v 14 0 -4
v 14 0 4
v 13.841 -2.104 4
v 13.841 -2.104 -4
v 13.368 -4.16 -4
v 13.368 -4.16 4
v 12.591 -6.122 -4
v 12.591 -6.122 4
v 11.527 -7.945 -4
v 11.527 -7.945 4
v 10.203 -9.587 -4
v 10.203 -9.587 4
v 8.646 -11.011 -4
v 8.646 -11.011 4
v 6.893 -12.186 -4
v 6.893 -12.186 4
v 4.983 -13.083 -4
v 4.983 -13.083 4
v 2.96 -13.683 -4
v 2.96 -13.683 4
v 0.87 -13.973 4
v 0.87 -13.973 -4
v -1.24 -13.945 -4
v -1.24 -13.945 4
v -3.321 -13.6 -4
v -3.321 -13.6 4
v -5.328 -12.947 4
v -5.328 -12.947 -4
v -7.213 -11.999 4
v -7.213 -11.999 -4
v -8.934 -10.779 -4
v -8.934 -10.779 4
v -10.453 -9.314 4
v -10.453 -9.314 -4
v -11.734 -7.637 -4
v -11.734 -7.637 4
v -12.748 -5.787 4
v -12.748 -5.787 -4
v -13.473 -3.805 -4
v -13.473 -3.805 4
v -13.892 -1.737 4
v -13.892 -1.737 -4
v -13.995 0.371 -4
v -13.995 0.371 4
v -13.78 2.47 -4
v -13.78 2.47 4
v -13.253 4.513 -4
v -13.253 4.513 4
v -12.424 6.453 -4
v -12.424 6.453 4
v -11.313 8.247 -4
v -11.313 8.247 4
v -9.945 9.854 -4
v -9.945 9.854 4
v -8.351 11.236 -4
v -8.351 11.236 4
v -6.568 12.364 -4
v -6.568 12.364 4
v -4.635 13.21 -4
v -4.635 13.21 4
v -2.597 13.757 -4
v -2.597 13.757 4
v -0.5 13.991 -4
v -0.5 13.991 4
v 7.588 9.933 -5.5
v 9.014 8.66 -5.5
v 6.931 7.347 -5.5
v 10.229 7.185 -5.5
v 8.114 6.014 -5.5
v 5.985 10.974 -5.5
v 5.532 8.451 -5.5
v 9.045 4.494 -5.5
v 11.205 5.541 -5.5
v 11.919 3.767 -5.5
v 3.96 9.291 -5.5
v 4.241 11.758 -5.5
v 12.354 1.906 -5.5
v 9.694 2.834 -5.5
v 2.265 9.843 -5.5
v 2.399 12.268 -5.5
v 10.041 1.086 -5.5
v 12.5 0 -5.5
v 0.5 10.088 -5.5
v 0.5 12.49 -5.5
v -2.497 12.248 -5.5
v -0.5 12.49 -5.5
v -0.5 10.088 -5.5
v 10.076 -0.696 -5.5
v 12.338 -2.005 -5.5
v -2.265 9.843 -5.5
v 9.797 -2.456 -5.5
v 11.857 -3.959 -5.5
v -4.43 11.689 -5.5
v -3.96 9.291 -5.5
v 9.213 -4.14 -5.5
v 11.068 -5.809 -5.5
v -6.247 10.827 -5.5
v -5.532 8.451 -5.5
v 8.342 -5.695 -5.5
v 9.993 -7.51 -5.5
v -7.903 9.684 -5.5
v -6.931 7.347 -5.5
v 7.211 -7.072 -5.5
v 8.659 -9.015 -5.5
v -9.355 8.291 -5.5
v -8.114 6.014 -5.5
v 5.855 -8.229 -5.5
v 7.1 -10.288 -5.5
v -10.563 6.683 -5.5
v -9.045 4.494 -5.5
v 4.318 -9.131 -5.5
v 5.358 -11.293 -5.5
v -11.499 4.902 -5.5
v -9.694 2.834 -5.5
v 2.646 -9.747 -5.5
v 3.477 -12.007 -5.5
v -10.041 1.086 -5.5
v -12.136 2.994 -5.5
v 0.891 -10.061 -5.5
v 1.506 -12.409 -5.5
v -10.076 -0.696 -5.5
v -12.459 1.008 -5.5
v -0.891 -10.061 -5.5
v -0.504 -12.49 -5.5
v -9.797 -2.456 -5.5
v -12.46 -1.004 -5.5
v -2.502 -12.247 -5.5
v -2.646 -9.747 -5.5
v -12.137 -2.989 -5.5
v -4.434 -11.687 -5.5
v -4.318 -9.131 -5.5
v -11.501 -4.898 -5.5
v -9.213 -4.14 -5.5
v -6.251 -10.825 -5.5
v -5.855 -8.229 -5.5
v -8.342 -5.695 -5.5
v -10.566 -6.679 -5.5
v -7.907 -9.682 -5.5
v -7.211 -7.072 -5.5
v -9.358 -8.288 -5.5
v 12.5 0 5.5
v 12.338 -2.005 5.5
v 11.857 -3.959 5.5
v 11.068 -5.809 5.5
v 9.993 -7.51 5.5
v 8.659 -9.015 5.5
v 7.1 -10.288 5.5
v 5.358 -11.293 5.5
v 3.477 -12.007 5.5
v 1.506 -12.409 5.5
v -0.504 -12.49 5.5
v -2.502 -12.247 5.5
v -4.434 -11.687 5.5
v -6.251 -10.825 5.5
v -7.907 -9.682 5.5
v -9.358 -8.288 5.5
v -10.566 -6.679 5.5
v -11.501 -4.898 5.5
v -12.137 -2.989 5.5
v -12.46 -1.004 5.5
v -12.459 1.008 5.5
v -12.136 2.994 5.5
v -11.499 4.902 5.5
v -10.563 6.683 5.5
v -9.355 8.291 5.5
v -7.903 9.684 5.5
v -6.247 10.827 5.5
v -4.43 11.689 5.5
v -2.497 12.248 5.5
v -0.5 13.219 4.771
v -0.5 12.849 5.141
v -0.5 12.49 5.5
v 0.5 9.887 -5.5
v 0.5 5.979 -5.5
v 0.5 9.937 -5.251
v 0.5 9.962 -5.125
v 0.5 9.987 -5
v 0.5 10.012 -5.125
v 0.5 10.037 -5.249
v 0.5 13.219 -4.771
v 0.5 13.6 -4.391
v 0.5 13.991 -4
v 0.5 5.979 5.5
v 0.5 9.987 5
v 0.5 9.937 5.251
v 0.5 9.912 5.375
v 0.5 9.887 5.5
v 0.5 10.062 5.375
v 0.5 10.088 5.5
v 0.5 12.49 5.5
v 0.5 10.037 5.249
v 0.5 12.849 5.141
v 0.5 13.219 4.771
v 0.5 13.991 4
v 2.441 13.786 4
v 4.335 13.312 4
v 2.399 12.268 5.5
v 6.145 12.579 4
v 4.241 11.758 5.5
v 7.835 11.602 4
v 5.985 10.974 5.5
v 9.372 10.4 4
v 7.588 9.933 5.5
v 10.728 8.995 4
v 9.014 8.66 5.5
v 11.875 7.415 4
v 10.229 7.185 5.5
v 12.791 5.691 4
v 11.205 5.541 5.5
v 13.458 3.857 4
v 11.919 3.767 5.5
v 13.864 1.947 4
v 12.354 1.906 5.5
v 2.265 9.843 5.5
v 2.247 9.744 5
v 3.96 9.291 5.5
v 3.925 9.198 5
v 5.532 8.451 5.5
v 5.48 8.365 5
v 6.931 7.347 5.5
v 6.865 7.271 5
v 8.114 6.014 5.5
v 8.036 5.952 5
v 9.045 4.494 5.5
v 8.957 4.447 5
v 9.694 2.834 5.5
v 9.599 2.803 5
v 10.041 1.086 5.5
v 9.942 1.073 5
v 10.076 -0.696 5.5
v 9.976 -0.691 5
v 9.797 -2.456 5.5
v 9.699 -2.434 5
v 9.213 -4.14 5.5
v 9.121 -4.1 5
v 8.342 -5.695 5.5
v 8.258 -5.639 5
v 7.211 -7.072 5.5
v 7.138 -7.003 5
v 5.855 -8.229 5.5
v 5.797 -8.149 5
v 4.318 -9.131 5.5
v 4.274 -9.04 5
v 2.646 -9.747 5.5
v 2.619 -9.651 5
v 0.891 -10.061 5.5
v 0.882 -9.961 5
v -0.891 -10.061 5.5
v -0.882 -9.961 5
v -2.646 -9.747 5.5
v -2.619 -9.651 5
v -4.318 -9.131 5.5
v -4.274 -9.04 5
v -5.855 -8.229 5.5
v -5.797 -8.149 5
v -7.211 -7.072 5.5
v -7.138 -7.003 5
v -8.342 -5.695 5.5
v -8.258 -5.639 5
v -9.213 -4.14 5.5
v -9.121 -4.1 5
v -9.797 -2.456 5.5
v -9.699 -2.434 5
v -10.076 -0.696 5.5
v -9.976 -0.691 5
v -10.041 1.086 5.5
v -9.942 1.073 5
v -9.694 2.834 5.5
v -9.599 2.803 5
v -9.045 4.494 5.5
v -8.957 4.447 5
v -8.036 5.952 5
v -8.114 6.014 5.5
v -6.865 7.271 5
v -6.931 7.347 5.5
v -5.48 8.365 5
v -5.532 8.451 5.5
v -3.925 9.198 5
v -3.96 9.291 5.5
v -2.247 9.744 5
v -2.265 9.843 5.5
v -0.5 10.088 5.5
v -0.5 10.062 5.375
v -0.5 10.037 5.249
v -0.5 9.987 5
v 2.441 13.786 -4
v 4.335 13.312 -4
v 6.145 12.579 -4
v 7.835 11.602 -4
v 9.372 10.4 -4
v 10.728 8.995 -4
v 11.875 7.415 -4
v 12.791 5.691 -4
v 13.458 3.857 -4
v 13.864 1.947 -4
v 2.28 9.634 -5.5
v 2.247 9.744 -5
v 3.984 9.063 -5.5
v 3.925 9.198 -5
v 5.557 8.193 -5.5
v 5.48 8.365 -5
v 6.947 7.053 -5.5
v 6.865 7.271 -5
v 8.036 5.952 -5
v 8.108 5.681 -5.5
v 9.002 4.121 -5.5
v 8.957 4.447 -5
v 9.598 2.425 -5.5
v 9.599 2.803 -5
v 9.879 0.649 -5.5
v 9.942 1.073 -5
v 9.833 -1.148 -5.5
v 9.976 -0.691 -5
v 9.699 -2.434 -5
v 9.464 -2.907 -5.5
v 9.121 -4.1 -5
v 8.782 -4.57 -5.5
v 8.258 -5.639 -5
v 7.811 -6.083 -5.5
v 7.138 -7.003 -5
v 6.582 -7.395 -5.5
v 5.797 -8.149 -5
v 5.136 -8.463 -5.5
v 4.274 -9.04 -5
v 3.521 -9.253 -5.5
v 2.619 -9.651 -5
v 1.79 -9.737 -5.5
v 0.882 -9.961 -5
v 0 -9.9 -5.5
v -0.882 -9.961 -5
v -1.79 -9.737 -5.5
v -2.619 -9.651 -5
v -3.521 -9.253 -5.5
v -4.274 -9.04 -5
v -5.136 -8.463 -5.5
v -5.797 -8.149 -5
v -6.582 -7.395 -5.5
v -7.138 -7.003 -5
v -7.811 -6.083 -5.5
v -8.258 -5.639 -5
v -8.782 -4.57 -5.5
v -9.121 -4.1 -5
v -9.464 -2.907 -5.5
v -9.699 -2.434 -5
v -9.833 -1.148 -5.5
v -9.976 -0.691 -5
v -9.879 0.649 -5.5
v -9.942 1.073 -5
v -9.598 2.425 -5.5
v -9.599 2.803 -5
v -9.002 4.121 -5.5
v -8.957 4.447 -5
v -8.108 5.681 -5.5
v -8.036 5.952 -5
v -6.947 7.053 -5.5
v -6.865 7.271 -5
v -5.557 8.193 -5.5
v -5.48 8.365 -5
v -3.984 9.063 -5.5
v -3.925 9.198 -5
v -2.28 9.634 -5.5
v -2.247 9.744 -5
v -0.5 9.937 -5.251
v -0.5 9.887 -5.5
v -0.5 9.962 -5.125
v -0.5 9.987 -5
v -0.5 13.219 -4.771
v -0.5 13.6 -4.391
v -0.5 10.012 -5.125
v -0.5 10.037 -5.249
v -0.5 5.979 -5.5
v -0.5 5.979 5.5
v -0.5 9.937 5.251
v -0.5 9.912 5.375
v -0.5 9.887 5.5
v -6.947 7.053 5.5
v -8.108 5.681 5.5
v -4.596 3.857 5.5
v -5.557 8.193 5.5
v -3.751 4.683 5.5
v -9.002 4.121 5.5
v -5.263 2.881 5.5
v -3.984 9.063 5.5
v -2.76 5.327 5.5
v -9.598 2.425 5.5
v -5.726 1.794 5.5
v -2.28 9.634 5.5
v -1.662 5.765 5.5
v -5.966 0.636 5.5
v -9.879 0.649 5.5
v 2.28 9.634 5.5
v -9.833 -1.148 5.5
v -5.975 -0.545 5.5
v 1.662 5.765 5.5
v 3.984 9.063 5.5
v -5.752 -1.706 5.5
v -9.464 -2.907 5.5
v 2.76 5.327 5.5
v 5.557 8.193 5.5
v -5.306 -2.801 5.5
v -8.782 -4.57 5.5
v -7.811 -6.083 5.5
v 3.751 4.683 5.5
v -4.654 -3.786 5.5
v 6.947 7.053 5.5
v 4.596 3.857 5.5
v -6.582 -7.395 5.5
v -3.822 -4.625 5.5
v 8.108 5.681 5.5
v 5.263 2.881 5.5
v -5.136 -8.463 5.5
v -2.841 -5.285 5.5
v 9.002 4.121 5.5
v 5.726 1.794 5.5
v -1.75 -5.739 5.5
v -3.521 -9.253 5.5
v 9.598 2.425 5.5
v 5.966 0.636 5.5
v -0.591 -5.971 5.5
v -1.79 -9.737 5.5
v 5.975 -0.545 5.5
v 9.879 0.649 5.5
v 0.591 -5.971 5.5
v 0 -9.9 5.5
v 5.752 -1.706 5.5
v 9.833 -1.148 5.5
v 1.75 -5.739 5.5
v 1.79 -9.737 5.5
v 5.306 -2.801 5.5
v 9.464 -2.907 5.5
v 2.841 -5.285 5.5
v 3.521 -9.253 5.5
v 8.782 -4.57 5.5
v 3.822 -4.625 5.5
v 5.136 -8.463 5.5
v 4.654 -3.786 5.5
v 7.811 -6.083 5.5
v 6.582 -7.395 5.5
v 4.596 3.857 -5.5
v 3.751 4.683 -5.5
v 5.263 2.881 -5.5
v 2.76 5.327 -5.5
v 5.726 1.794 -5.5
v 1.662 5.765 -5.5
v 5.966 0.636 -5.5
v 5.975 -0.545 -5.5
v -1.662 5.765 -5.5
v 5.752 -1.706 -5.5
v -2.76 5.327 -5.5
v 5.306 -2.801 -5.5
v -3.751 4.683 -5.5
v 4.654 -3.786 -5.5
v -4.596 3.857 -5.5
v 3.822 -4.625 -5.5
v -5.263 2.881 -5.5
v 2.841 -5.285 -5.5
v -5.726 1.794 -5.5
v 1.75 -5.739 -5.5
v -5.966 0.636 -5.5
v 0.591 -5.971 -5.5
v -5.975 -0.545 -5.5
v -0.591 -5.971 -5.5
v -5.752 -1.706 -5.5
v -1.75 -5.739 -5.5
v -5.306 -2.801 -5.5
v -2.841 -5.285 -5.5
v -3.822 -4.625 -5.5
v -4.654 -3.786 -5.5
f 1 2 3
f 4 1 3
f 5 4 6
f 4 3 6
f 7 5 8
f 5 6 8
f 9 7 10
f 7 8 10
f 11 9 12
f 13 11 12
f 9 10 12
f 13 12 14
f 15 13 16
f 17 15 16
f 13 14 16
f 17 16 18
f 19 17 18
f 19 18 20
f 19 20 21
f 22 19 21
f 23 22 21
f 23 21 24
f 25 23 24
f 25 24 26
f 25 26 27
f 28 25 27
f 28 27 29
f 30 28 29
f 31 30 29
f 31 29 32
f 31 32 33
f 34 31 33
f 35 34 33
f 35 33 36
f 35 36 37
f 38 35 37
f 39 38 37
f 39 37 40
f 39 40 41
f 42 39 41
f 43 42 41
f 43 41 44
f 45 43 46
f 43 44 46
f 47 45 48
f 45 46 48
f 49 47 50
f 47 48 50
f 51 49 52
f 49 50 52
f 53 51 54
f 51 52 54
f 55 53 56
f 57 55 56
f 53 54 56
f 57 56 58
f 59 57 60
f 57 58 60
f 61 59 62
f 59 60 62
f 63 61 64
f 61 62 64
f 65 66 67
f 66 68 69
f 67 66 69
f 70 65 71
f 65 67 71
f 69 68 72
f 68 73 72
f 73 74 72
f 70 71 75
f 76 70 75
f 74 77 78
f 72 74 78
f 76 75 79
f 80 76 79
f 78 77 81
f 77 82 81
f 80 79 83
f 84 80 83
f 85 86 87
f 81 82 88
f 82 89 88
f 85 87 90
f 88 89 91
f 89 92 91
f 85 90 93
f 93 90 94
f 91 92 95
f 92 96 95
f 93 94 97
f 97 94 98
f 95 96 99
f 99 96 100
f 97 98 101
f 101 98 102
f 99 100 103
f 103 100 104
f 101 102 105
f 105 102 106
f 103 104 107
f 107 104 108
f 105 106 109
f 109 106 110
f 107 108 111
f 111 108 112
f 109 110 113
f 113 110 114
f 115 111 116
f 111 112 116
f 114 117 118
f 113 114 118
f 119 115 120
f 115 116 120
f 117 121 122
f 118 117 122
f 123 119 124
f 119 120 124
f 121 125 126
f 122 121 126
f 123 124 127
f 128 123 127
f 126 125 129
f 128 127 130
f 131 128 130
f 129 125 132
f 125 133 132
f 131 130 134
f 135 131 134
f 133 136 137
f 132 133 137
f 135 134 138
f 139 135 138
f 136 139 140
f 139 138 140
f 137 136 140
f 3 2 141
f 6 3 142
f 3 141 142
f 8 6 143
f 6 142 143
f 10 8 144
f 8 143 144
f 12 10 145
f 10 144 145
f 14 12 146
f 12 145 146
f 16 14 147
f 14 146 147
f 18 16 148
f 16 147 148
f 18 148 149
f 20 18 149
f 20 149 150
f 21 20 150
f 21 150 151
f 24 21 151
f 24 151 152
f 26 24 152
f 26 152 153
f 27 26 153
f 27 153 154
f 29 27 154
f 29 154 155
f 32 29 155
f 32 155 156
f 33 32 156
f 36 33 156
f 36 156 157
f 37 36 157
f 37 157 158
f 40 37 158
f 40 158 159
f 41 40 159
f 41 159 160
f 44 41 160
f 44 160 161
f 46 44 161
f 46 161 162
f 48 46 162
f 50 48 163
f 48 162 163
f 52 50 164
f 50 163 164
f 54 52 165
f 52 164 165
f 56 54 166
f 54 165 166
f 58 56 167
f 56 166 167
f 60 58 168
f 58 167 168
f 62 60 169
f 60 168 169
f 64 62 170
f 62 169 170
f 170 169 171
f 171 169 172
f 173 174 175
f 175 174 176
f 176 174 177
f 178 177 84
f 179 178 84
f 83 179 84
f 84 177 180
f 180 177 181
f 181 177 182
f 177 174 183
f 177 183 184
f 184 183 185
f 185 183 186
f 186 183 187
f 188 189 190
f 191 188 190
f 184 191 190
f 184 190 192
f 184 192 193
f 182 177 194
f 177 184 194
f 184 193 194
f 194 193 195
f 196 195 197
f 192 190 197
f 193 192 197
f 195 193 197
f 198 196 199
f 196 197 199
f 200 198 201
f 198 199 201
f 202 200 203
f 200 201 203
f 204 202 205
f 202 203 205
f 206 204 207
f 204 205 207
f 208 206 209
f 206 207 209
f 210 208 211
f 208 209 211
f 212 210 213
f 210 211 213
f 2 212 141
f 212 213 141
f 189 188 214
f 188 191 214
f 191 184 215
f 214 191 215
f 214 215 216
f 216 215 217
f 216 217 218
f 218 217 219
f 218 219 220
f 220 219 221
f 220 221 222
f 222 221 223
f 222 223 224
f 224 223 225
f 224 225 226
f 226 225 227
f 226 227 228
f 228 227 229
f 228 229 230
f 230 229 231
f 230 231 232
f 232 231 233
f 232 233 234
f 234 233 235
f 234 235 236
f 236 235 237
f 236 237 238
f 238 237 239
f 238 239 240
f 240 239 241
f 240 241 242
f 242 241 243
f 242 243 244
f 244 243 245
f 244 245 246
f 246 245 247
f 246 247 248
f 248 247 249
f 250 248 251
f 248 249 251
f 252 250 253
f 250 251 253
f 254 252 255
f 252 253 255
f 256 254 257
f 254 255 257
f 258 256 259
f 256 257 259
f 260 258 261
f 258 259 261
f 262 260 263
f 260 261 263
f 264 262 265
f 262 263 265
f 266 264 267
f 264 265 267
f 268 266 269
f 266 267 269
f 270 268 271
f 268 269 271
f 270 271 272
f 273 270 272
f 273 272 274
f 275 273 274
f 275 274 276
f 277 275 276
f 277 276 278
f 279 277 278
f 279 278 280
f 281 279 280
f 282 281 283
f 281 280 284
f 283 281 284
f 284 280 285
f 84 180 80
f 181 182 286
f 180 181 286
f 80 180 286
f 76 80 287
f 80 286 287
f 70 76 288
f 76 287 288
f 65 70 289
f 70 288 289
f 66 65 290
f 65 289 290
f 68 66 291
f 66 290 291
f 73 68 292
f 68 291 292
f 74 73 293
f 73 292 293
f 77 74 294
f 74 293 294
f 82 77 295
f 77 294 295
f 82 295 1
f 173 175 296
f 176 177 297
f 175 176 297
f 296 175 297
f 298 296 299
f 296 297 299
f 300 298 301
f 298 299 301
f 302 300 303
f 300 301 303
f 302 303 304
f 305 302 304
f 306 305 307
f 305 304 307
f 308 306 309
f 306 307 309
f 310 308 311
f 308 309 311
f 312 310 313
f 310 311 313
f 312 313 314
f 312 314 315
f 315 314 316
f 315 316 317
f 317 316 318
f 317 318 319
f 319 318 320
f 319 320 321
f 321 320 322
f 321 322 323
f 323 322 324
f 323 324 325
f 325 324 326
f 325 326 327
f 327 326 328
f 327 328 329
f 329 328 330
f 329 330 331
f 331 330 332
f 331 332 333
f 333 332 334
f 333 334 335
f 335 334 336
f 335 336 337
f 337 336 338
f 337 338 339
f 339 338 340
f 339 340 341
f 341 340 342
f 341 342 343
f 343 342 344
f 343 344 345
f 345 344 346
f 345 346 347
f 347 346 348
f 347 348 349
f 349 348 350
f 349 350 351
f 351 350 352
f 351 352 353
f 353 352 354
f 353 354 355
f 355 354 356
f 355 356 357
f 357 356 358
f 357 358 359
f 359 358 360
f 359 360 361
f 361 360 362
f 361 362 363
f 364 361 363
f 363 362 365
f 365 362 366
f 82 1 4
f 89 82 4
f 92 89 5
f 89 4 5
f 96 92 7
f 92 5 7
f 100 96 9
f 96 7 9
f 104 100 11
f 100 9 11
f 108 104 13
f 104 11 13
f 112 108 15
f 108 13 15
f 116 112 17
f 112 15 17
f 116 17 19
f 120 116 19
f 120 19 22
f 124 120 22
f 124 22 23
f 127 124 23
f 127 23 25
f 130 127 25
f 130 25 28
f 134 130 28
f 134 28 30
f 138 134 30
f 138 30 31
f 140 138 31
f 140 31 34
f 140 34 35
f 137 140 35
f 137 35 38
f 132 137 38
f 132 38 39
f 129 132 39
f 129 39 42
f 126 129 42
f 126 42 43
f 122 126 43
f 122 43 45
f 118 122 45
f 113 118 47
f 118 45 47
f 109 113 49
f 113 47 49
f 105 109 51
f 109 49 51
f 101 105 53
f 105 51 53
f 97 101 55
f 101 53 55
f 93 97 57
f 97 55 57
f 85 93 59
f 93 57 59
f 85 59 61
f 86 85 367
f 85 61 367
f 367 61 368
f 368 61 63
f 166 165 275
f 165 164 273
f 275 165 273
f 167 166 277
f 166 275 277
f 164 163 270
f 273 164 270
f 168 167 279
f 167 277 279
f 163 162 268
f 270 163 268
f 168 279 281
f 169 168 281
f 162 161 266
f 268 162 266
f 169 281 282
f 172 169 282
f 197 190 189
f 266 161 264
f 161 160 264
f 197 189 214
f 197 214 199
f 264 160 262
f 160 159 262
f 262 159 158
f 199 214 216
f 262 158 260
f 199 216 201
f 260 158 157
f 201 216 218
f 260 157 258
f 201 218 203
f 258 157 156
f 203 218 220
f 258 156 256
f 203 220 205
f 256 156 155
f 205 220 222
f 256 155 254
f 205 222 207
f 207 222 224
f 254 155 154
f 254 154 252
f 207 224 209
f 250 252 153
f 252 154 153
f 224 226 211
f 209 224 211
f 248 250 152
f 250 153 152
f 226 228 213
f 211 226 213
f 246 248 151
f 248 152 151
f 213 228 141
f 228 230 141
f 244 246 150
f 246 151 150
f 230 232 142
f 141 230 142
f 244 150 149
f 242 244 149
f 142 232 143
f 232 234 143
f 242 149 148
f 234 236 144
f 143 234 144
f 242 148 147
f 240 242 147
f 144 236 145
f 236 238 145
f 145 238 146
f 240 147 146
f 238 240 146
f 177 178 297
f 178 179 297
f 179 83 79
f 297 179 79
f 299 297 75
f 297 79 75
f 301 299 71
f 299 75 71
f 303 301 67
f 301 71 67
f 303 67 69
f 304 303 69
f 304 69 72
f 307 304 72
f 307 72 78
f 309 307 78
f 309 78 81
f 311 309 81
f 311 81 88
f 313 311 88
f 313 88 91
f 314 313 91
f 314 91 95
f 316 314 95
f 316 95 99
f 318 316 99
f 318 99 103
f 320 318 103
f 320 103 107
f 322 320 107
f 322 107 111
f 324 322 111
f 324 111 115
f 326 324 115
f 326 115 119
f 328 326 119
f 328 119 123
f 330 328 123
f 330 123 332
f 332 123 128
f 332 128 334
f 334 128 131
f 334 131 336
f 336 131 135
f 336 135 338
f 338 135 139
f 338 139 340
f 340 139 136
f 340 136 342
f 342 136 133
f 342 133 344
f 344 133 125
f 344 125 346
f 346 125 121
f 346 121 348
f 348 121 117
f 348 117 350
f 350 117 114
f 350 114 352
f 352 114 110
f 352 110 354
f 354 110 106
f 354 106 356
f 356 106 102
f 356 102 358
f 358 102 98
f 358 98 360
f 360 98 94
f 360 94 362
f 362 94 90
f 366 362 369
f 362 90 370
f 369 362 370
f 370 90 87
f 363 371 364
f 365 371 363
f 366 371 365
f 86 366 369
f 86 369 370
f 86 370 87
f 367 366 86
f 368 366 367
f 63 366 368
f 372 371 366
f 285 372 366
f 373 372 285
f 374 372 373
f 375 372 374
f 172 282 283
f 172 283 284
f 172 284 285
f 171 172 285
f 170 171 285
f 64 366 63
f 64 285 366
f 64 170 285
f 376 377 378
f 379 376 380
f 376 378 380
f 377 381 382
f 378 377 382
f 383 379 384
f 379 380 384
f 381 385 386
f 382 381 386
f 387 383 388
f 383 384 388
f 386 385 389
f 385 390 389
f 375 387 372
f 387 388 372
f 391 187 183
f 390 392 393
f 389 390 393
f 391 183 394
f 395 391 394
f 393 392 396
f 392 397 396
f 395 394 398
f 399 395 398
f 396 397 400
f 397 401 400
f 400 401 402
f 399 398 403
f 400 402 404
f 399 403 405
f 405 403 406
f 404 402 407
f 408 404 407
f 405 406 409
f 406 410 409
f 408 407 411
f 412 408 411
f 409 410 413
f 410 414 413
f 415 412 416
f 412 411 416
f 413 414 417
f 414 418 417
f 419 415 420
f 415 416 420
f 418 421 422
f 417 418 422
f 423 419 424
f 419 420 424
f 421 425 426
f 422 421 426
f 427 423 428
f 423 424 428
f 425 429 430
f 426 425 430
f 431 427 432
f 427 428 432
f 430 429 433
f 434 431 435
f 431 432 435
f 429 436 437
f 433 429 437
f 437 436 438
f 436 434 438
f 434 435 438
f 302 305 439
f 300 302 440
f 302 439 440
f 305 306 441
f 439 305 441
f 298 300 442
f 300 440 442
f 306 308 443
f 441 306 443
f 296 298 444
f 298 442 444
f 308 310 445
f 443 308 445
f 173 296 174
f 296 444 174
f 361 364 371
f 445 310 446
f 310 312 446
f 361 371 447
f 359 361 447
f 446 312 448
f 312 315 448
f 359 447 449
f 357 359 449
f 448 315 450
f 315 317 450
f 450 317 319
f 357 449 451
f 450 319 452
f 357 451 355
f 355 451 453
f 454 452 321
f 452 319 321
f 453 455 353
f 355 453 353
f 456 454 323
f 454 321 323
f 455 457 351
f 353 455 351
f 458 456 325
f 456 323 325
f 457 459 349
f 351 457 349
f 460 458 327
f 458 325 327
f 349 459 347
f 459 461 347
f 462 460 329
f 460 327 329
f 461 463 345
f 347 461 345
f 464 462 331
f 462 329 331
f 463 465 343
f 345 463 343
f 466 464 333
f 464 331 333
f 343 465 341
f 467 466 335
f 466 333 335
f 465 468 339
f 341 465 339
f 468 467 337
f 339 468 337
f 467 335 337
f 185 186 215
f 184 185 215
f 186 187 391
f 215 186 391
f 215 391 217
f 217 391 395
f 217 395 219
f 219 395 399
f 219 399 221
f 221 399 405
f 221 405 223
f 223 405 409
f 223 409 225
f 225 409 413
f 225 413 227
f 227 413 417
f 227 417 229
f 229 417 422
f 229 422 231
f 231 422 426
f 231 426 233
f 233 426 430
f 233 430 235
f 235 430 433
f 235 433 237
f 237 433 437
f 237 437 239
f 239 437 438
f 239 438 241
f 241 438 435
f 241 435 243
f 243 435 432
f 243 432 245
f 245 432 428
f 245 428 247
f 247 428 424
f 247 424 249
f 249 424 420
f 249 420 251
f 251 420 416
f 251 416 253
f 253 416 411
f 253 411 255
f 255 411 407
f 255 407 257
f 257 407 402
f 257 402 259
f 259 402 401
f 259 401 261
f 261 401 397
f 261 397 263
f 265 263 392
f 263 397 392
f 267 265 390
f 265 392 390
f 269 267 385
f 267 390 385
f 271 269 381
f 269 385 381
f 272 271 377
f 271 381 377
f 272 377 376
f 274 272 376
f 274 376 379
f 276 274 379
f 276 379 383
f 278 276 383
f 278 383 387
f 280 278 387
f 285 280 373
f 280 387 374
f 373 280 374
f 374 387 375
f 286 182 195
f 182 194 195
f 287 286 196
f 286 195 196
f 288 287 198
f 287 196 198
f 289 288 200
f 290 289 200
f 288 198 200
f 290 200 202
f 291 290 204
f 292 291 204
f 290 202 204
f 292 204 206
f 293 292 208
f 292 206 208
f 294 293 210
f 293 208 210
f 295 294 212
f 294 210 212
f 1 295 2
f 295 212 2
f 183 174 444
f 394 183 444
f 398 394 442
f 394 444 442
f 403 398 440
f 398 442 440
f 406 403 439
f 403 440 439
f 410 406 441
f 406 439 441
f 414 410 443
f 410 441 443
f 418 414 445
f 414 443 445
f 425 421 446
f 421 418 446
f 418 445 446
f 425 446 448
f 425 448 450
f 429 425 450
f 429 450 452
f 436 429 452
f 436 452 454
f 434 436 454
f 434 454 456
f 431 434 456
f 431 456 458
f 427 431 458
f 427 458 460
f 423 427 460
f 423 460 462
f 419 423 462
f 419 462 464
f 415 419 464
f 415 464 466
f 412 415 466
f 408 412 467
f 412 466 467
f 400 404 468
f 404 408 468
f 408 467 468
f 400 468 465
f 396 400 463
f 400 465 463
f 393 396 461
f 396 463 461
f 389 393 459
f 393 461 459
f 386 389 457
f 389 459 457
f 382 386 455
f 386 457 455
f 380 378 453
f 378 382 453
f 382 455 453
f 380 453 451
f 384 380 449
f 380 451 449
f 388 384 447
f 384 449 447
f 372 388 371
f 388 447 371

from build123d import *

# Parameters (mm, degrees)
SKETCH3_W          = 1
SKETCH3_H          = 14
CUT_EXTRUDE2_DEPTH = 15


with BuildPart() as part:
    # Sketch1 → Revolve1 (revolve)
    with BuildSketch(Plane(origin=(0, 0, 0), x_dir=(0, 0, -1), z_dir=(1, 0, 0)), mode=Mode.PRIVATE) as revolve1_sk:
        Polygon((-5.5, 6), (5.5, 6), (5.5, 9.9), (5, 10), (5.5, 10.1), (5.5, 12.5), (4, 14), (-4, 14), (-5.5, 12.5), (-5.5, 10.1), (-5, 10), (-5.5, 9.9), align=None)
    revolve(revolve1_sk.sketch.rotate(Axis((0, 0, 10.112306333), (0, 0, -1)), 90), axis=Axis((0, 0, 10.112306333), (0, 0, -1)))

    # Sketch3 → Cut-Extrude2 (cut, symmetric)
    with BuildSketch(Plane.XY):
        with Locations((0, 7)):
            Rectangle(SKETCH3_W, SKETCH3_H)
    extrude(amount=CUT_EXTRUDE2_DEPTH, both=True, mode=Mode.SUBTRACT)


solid = part.part
